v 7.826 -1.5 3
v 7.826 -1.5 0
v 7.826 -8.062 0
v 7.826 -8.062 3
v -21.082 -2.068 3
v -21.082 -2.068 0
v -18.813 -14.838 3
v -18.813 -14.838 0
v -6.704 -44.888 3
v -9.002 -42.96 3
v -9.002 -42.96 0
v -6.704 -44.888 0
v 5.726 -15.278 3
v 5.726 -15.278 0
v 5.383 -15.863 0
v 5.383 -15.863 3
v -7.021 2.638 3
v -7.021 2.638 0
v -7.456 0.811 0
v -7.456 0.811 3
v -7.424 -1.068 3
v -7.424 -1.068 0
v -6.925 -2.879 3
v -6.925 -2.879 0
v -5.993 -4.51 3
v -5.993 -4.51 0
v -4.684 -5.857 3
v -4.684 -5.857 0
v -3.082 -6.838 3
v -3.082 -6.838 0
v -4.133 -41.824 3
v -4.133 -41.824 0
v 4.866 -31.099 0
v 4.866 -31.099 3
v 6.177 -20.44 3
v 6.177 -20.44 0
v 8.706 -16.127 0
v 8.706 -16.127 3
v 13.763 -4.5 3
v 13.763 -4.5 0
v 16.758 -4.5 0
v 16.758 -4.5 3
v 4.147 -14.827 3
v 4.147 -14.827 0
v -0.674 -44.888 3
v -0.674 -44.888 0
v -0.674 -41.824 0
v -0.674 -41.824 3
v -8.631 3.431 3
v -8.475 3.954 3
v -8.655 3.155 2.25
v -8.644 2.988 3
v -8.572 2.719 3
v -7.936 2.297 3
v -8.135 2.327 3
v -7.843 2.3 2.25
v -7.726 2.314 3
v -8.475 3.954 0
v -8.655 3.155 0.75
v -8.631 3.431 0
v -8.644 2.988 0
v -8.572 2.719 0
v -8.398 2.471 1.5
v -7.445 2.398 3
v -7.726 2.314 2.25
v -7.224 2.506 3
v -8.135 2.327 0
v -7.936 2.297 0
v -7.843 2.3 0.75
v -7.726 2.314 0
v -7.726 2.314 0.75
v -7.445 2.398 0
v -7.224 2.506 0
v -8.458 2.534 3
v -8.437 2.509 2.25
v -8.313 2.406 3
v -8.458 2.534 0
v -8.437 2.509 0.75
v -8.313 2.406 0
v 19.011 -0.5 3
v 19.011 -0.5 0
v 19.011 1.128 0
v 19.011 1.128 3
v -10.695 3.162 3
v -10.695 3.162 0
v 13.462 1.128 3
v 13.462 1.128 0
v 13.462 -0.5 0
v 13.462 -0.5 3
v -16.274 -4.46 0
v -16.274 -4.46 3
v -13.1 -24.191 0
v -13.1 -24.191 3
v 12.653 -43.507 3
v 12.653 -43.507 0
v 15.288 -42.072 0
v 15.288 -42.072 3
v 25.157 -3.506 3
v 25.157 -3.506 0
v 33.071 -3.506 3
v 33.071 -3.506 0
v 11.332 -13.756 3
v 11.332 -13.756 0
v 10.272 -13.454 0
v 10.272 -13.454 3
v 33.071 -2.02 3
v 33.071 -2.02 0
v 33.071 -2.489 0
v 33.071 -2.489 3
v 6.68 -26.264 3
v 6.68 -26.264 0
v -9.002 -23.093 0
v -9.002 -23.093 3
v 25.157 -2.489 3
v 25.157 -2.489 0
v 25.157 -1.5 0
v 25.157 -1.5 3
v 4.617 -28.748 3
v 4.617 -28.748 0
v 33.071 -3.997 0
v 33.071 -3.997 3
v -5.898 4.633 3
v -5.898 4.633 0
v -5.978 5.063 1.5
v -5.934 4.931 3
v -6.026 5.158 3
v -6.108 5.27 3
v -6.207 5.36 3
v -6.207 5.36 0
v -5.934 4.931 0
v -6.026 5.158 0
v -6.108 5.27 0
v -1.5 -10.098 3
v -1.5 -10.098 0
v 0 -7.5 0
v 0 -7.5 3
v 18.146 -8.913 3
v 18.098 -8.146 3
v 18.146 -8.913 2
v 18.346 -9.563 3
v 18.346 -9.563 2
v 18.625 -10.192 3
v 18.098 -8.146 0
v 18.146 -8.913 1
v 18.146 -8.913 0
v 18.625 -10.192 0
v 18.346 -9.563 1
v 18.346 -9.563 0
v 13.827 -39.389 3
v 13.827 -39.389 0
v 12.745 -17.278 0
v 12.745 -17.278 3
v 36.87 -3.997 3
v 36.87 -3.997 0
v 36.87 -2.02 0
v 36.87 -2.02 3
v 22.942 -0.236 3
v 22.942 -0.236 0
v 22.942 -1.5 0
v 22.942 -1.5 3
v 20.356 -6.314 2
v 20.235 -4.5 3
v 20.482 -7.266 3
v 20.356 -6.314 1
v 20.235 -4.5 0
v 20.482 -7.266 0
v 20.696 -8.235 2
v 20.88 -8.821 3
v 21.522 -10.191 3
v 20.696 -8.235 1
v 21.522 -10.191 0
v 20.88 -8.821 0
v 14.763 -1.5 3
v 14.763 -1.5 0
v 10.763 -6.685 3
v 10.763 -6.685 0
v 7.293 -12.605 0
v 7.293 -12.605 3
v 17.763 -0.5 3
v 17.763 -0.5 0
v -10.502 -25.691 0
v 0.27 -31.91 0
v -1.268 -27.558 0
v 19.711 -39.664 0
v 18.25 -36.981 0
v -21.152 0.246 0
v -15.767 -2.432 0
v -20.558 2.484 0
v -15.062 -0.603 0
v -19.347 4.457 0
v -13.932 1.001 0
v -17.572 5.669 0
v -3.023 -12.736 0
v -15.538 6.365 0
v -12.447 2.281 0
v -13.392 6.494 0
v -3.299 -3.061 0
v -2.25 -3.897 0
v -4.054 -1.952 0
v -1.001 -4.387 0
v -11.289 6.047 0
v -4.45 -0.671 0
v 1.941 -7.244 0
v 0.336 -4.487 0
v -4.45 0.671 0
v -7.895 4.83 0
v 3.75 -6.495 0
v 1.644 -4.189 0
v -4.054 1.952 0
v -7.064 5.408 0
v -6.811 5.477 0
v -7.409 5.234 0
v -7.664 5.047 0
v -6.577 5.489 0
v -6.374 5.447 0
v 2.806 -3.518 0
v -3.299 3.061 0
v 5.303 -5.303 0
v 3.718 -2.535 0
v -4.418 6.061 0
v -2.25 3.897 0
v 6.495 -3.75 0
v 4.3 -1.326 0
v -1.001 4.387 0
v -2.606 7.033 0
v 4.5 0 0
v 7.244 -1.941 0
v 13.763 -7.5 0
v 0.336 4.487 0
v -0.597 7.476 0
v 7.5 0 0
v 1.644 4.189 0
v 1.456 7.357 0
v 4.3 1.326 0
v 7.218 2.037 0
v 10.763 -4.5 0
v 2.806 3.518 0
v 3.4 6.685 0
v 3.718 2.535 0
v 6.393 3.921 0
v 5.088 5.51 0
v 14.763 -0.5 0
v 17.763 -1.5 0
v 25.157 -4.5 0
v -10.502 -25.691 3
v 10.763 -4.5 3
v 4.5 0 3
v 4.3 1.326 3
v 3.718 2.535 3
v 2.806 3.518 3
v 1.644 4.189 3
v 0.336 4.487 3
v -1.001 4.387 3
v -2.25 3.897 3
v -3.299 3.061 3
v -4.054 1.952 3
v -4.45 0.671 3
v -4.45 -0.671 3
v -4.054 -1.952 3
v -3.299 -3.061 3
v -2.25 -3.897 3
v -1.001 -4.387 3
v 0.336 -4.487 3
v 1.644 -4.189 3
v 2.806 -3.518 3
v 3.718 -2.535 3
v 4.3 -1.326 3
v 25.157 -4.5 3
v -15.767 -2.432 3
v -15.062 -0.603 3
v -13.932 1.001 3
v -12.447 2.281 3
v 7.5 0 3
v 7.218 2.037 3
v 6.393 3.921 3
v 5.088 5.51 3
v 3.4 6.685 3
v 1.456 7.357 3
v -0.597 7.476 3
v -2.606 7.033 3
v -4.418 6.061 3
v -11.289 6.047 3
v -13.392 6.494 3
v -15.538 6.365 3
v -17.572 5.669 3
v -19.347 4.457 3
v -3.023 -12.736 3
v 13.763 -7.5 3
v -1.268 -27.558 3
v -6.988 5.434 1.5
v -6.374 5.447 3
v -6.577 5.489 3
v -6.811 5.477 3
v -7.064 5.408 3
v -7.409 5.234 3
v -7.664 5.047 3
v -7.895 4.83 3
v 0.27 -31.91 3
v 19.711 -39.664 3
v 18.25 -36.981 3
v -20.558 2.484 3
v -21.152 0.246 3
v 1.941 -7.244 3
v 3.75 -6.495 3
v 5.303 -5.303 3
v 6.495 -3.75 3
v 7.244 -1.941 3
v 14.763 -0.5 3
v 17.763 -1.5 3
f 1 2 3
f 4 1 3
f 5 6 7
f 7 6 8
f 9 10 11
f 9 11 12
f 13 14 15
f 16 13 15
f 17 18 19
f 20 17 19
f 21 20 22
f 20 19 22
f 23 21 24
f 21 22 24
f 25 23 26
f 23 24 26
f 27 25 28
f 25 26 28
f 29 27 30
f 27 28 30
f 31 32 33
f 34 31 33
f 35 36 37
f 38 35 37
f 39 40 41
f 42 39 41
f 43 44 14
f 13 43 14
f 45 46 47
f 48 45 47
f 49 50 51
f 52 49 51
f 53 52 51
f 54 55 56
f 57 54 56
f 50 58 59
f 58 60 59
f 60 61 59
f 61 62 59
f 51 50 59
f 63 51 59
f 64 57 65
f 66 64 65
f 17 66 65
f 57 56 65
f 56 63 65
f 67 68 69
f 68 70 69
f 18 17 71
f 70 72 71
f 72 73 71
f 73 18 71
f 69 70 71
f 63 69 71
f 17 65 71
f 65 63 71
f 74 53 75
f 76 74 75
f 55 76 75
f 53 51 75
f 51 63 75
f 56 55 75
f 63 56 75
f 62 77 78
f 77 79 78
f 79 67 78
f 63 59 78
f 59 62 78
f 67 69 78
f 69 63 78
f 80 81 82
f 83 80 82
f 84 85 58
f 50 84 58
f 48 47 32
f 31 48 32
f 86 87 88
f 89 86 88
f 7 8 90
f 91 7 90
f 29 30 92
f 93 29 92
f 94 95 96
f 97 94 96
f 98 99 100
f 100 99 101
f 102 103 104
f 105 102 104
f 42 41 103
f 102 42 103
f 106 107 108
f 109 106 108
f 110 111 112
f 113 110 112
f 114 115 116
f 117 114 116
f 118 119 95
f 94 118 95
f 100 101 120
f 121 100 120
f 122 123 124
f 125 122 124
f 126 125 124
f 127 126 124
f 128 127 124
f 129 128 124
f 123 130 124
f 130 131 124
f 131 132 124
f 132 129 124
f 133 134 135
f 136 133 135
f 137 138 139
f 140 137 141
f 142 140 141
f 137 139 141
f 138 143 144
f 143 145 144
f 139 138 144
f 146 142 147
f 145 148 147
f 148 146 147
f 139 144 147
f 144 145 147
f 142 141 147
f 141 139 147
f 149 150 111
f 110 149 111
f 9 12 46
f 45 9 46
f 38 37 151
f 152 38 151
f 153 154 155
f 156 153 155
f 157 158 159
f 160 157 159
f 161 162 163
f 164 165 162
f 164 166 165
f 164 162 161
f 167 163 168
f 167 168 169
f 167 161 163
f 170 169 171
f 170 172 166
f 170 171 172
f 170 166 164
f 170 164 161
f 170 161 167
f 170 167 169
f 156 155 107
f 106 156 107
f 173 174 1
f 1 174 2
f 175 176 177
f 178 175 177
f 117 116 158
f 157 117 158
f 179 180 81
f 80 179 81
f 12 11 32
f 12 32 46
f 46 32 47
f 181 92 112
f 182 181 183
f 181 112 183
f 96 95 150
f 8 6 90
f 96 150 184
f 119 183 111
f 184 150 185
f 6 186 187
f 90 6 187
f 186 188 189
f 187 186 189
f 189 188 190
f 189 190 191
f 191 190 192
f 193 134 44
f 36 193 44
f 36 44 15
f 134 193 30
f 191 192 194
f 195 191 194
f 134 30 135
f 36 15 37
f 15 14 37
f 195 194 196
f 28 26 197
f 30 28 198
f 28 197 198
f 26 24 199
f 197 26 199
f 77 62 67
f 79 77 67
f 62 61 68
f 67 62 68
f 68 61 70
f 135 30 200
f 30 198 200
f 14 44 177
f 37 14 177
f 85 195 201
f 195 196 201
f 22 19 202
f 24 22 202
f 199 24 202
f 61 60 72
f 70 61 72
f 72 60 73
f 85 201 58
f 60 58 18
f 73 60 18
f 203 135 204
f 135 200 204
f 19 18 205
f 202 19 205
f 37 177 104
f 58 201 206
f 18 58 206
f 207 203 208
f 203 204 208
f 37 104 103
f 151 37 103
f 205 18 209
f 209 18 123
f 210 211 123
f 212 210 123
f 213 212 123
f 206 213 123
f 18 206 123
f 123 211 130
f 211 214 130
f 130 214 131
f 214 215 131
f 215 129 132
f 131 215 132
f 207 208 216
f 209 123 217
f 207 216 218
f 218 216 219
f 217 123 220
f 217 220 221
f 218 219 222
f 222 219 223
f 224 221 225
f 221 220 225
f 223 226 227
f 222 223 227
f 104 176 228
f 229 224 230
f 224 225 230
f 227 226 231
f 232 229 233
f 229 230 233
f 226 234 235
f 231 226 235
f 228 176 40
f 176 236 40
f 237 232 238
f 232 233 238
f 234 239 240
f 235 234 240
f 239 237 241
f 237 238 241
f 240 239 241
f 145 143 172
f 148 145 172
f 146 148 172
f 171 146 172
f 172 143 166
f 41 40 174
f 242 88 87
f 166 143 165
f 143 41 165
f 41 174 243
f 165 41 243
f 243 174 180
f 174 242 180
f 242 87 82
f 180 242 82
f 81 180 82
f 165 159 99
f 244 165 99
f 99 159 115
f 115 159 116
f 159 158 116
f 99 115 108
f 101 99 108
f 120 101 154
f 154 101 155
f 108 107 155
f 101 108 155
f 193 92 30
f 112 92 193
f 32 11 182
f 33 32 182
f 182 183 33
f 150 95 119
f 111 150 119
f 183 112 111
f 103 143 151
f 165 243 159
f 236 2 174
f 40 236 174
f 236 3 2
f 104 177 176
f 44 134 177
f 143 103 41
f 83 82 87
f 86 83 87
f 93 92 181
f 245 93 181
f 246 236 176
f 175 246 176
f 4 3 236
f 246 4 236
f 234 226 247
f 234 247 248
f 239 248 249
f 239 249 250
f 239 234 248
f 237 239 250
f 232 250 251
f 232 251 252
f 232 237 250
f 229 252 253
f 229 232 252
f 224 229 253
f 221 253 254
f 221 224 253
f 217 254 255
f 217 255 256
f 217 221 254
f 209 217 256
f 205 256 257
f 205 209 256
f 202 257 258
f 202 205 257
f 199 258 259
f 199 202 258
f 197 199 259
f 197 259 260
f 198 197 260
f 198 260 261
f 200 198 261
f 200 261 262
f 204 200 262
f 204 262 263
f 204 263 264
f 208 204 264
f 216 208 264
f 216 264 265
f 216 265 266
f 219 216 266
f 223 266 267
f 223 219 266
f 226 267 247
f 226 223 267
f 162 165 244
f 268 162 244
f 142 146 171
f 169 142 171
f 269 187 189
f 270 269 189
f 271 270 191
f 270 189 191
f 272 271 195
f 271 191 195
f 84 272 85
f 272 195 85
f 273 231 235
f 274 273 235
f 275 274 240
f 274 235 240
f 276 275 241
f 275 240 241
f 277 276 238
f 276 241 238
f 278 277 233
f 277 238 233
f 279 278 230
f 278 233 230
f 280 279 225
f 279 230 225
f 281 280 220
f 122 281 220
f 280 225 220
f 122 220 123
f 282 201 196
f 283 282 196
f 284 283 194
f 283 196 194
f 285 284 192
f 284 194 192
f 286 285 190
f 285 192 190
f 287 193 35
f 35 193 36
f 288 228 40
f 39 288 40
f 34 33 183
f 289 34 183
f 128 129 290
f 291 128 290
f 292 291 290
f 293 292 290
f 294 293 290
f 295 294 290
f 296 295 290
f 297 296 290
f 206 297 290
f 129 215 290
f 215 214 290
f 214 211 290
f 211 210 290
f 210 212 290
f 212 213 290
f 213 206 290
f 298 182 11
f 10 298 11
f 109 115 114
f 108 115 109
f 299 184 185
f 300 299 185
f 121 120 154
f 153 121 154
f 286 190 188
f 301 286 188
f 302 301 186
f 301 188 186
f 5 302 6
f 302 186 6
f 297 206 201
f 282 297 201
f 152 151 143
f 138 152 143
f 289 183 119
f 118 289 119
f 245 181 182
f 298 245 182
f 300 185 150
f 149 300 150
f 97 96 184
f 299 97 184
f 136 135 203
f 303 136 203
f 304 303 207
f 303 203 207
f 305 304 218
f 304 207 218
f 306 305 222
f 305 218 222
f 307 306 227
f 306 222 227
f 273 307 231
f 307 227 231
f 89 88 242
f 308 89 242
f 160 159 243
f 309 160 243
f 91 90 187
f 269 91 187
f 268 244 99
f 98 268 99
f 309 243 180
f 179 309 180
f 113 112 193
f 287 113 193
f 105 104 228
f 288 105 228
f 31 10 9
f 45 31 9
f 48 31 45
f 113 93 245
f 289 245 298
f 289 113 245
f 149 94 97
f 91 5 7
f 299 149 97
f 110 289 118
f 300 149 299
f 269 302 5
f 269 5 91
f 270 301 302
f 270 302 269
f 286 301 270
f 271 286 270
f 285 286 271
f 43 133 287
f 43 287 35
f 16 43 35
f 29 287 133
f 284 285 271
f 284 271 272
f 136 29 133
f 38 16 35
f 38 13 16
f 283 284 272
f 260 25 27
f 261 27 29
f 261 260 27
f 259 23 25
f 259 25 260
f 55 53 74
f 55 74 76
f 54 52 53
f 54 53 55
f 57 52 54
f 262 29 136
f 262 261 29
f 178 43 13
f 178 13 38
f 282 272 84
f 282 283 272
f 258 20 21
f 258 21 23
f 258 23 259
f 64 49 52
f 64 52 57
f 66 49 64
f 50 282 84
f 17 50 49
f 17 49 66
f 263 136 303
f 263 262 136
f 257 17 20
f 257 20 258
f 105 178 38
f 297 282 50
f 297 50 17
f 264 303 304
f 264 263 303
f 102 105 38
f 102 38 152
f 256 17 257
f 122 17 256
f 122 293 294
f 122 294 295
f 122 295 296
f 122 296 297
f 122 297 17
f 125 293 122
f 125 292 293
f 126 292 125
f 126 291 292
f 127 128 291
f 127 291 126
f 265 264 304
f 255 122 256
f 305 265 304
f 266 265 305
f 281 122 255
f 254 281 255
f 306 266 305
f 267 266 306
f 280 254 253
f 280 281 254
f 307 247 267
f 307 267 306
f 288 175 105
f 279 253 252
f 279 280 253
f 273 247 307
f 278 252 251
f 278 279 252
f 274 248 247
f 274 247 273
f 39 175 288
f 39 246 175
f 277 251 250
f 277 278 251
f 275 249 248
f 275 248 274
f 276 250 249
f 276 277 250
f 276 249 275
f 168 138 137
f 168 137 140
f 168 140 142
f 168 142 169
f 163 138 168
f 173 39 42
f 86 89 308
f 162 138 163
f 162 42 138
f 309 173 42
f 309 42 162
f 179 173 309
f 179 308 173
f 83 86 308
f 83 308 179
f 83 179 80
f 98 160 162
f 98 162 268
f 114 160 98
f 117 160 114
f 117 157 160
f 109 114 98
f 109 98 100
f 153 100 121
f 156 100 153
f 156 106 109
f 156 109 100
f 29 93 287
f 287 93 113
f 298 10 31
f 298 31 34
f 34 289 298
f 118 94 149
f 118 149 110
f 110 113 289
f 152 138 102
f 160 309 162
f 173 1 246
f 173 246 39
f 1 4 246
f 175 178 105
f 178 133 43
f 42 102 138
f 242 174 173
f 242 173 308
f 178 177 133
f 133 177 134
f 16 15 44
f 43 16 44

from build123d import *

# Parameters (mm, degrees)
F0_W        = 7.9140815362
F0_H        = 1.0166466236
F0_W_2      = 3
F0_H_2      = 1
F0_R        = 4.5
F1_DEPTH    = 3
F2_T1_DEPTH = 3
F2_T3_DEPTH = 28.8894591878
F2_T5_DEPTH = 23.3681675465


# Not quite as in the source:
# - a fillet or chamfer that OpenCascade refuses, or shapes differently, is made with other operations: its cross-section is extruded or revolved along the edge and cut away or added


with BuildPart() as f1:
    # F0 (on Top) → F1 (new body)
    with BuildSketch(Plane.XY):
        Polygon((13.4622063488, -0.5), (14.7628532723, -0.5), (17.7628532723, -0.5), (19.0106034279, -0.5), (19.0106034279, 1.1280798353), (13.4622063488, 1.1280798353), align=None)
        Polygon((10.7628532723, -6.6854998734), (7.292940495, -12.6047210891), (10.2724858996, -13.4541141028), (13.7628532723, -7.5), (13.7628532723, -4.5), (10.7628532723, -4.5), align=None)
        with BuildLine():
            Line((-14.7281754762, 1.7223088071), (-8.4750935815, 3.9539961383))
            add(Edge.make_bspline(
                [(-7.8951590451, 4.8302771503), (-8.2686696422, 4.4379188565), (-8.4750935815, 3.9539961383)],
                knots=[1.3532409109, 1.3532409109, 1.3532409109, 1.9420651459, 1.9420651459, 1.9420651459], degree=2, weights=[1, 0.9569728978, 1]))
            Line((-7.8951590451, 4.8302771503), (-16.1634236574, 7.7945101075))
            Line((-16.1634236574, 7.7945101075), (-21.7940099537, 1.9431159599))
            Line((-21.7940099537, 1.9431159599), (-18.813110888, -14.8382401094))
            Line((-18.813110888, -14.8382401094), (-16.2738263607, -4.4602961279))
            Line((-16.2738263607, -4.4602961279), (-14.7281754762, 1.7223088071))
        make_face()
        Polygon((-4.1330147038, -41.823990643), (-6.7042714065, -44.8882950559), (-0.673970324, -44.8882950559), (-0.673970324, -41.823990643), align=None)
        Polygon((7.292940495, -12.6047210891), (-1.5, -10.0980762114), (4.1472461263, -14.8274837274), (5.7260863187, -15.2775711223), align=None)
        Polygon((33.0707170069, -2.4889647029), (33.0707170069, -3.5056113265), (33.0707170069, -3.9974618703), (36.8696413934, -3.9974618703), (36.8696413934, -2.0199886058), (33.0707170069, -2.0199886058), align=None)
        Polygon((18.2495536771, -36.9809648262), (13.8269943134, -39.3890709971), (15.287962521, -42.0721830228), (19.7105218846, -39.6640768519), align=None)
        with Locations((29.1136762388, -2.9972880147)):
            Rectangle(F0_W, F0_H)
        Polygon((-9.0024047358, -23.0926223927), (-10.5024047358, -25.6906986041), (-1.2683224195, -27.5578969), align=None)
        with BuildLine():
            add(Edge.make_bspline(
                [(-8.4750935815, 3.9539961383), (-9.9447387818, 0.5086849859), (-7.0206677136, 2.6382238069)],
                knots=[1.9420651459, 1.9420651459, 1.9420651459, 4.2160777827, 4.2160777827, 4.2160777827], degree=2, weights=[1, 0.420312788, 1]))
            ThreePointArc((-7.0206677136, 2.6382238069), (-6.5359057109, 3.6785780593), (-5.8980778892, 4.6327828799))
            add(Edge.make_bspline(
                [(-5.8980778892, 4.6327828799), (-5.898901623, 5.1347150622), (-6.2072743134, 5.3597039059)],
                knots=[5.6018784444, 5.6018784444, 5.6018784444, 6.2831853072, 6.2831853072, 6.2831853072], degree=2, weights=[1, 0.9425365533, 1]))
            add(Edge.make_bspline(
                [(-6.2072743134, 5.3597039059), (-6.9059188983, 5.8694352869), (-7.8951590451, 4.8302771503)],
                knots=[0, 0, 0, 1.3532409109, 1.3532409109, 1.3532409109], degree=2, weights=[1, 0.7796933083, 1]))
            add(Edge.make_bspline(
                [(-7.8951590451, 4.8302771503), (-8.2686696422, 4.4379188565), (-8.4750935815, 3.9539961383)],
                knots=[1.3532409109, 1.3532409109, 1.3532409109, 1.9420651459, 1.9420651459, 1.9420651459], degree=2, weights=[1, 0.9569728978, 1]))
        make_face()
        Polygon((8.7628532723, -4.5), (10.7628532723, -4.5), (13.7628532723, -4.5), (16.7579661865, -4.5), (20.2354351463, -4.5), (25.1566354707, -4.5), (25.1566354707, -3.5056113265), (25.1566354707, -2.4889647029), (25.1566354707, -1.5), (22.9422256299, -1.5), (17.7628532723, -1.5), (14.7628532723, -1.5), (8.7628532723, -1.5), align=None)
        with BuildLine():
            Line((20.2354351463, -4.5), (18.0979731586, -8.1462329624))
            add(Edge.make_bspline(
                [(18.0979731586, -8.1462329624), (18.0473234504, -9.0044103563), (18.3297842741, -9.5410849899), (18.6251010746, -10.1915458217)],
                knots=[0, 0, 0, 0, 2.1121478481, 2.1121478481, 2.1121478481, 2.1121478481], degree=3))
            Line((18.6251010746, -10.1915458217), (21.5215887874, -10.1907448843))
            add(Edge.make_bspline(
                [(20.2354351463, -4.5), (20.3352533281, -6.2362966128), (20.3635003418, -8.2417670637), (21.5215887874, -10.1907448843)],
                knots=[0, 0, 0, 0, 5.8342753215, 5.8342753215, 5.8342753215, 5.8342753215], degree=3))
        make_face()
        with BuildLine():
            ThreePointArc((0, -7.5), (-1.5760318318, -7.3325386917), (-3.0816838363, -6.8376329774))
            Line((-3.0816838363, -6.8376329774), (-13.1004809472, -24.1906986041))
            Line((-13.1004809472, -24.1906986041), (-10.5024047358, -25.6906986041))
            Line((-10.5024047358, -25.6906986041), (-9.0024047358, -23.0926223927))
            Line((-9.0024047358, -23.0926223927), (-3.0228838472, -12.7357884087))
            Line((-3.0228838472, -12.7357884087), (-1.5, -10.0980762114))
            Line((-1.5, -10.0980762114), (0, -7.5))
        make_face()
        with BuildLine():
            ThreePointArc((-5.8980778892, 4.6327828799), (-6.5359057109, 3.6785780593), (-7.0206677136, 2.6382238069))
            add(Edge.make_bspline(
                [(-7.0206677136, 2.6382238069), (-5.896148589, 3.4571871888), (-5.8980778892, 4.6327828799)],
                knots=[4.2160777827, 4.2160777827, 4.2160777827, 5.6018784444, 5.6018784444, 5.6018784444], degree=2, weights=[1, 0.7693966053, 1]))
        make_face()
        Polygon((11.3319195864, -13.7561318437), (10.2724858996, -13.4541141028), (8.7056317233, -16.1269641361), (12.7446108147, -17.2783748907), (18.0979731586, -8.1462329624), (20.2354351463, -4.5), (16.7579661865, -4.5), align=None)
        Polygon((7.8259082511, -8.0615244806), (10.7628532723, -4.5), (8.7628532723, -4.5), (8.7628532723, -1.5), (7.8259082511, -1.5), align=None)
        with Locations((16.2628532723, -1)):
            Rectangle(F0_W_2, F0_H_2)
        with BuildLine():
            ThreePointArc((-7.0206677136, 2.6382238069), (-6.9254849764, -2.8788292484), (-3.0816838363, -6.8376329774))
            ThreePointArc((-3.0816838363, -6.8376329774), (-1.5760318318, -7.3325386917), (0, -7.5))
            ThreePointArc((0, -7.5), (5.3033008589, -5.3033008589), (7.5, 0))
            ThreePointArc((7.5, 0), (2.4509606107, 7.088215014), (-5.8980778892, 4.6327828799))
            add(Edge.make_bspline(
                [(-7.0206677136, 2.6382238069), (-5.896148589, 3.4571871888), (-5.8980778892, 4.6327828799)],
                knots=[4.2160777827, 4.2160777827, 4.2160777827, 5.6018784444, 5.6018784444, 5.6018784444], degree=2, weights=[1, 0.7693966053, 1]))
        make_face()
        Circle(F0_R, mode=Mode.SUBTRACT)
        Polygon((-1.2683224195, -27.5578969), (-10.5024047358, -25.6906986041), (0.2696389092, -31.9099409022), (-9.0024047358, -42.9599322269), (-6.7042714065, -44.8882950559), (-4.1330147038, -41.823990643), (4.8659055679, -31.0994950798), align=None)
        Polygon((10.2724858996, -13.4541141028), (7.292940495, -12.6047210891), (5.7260863187, -15.2775711223), (8.7056317233, -16.1269641361), align=None)
        Polygon((22.9422256299, -0.2355174292), (22.9422256299, -1.5), (25.1566354707, -1.5), align=None)
        Polygon((6.6801939907, -26.2637573918), (-9.0024047358, -23.0926223927), (-1.2683224195, -27.5578969), (4.616944438, -28.7479404659), (12.6532249158, -43.5068111111), (15.287962521, -42.0721830228), (13.8269943134, -39.3890709971), align=None)
        Polygon((4.1472461263, -14.8274837274), (-1.5, -10.0980762114), (-3.0228838472, -12.7357884087), (6.1770209488, -20.4404462041), (8.7056317233, -16.1269641361), (5.7260863187, -15.2775711223), (5.3831728236, -15.8625370756), align=None)
    extrude(amount=F1_DEPTH)

    # F2: fillet of radius 8 on 3 edges, made by hand

    # F2_s2 → F2_t1 (join)
    with BuildSketch(Plane.XY):
        with BuildLine():
            ThreePointArc((-15.7668598362, -2.4324295718), (-13.9323879929, 1.0007952454), (-10.6947478435, 3.1618148779))
            Line((-10.6947478435, 3.1618148779), (-14.7281754762, 1.7223088071))
            Line((-14.7281754762, 1.7223088071), (-15.7668598362, -2.4324295718))
        make_face()
    extrude(amount=F2_T1_DEPTH)

    # F2_s4 → F2_t3 (cut)
    with BuildSketch(Plane.XY.offset(-12.9447295939)):
        with BuildLine():
            ThreePointArc((-11.2892959012, 6.0470998817), (-15.8144489693, 6.3053971181), (-19.7536720515, 4.0634673109))
            Line((-19.7536720515, 4.0634673109), (-16.1634236574, 7.7945101075))
            Line((-16.1634236574, 7.7945101075), (-11.2892959012, 6.0470998817))
        make_face()
    extrude(amount=F2_T3_DEPTH, mode=Mode.SUBTRACT)

    # F2_s6 → F2_t5 (cut)
    with BuildSketch(Plane.XY.offset(-10.1840837733)):
        with BuildLine():
            ThreePointArc((-18.9694325729, 4.8784613548), (-20.8588428617, 1.6587603608), (-21.0815566526, -2.0677318634))
            Line((-21.0815566526, -2.0677318634), (-21.7940099537, 1.9431159599))
            Line((-21.7940099537, 1.9431159599), (-18.9694325729, 4.8784613548))
        make_face()
    extrude(amount=F2_T5_DEPTH, mode=Mode.SUBTRACT)


solid = f1.part
